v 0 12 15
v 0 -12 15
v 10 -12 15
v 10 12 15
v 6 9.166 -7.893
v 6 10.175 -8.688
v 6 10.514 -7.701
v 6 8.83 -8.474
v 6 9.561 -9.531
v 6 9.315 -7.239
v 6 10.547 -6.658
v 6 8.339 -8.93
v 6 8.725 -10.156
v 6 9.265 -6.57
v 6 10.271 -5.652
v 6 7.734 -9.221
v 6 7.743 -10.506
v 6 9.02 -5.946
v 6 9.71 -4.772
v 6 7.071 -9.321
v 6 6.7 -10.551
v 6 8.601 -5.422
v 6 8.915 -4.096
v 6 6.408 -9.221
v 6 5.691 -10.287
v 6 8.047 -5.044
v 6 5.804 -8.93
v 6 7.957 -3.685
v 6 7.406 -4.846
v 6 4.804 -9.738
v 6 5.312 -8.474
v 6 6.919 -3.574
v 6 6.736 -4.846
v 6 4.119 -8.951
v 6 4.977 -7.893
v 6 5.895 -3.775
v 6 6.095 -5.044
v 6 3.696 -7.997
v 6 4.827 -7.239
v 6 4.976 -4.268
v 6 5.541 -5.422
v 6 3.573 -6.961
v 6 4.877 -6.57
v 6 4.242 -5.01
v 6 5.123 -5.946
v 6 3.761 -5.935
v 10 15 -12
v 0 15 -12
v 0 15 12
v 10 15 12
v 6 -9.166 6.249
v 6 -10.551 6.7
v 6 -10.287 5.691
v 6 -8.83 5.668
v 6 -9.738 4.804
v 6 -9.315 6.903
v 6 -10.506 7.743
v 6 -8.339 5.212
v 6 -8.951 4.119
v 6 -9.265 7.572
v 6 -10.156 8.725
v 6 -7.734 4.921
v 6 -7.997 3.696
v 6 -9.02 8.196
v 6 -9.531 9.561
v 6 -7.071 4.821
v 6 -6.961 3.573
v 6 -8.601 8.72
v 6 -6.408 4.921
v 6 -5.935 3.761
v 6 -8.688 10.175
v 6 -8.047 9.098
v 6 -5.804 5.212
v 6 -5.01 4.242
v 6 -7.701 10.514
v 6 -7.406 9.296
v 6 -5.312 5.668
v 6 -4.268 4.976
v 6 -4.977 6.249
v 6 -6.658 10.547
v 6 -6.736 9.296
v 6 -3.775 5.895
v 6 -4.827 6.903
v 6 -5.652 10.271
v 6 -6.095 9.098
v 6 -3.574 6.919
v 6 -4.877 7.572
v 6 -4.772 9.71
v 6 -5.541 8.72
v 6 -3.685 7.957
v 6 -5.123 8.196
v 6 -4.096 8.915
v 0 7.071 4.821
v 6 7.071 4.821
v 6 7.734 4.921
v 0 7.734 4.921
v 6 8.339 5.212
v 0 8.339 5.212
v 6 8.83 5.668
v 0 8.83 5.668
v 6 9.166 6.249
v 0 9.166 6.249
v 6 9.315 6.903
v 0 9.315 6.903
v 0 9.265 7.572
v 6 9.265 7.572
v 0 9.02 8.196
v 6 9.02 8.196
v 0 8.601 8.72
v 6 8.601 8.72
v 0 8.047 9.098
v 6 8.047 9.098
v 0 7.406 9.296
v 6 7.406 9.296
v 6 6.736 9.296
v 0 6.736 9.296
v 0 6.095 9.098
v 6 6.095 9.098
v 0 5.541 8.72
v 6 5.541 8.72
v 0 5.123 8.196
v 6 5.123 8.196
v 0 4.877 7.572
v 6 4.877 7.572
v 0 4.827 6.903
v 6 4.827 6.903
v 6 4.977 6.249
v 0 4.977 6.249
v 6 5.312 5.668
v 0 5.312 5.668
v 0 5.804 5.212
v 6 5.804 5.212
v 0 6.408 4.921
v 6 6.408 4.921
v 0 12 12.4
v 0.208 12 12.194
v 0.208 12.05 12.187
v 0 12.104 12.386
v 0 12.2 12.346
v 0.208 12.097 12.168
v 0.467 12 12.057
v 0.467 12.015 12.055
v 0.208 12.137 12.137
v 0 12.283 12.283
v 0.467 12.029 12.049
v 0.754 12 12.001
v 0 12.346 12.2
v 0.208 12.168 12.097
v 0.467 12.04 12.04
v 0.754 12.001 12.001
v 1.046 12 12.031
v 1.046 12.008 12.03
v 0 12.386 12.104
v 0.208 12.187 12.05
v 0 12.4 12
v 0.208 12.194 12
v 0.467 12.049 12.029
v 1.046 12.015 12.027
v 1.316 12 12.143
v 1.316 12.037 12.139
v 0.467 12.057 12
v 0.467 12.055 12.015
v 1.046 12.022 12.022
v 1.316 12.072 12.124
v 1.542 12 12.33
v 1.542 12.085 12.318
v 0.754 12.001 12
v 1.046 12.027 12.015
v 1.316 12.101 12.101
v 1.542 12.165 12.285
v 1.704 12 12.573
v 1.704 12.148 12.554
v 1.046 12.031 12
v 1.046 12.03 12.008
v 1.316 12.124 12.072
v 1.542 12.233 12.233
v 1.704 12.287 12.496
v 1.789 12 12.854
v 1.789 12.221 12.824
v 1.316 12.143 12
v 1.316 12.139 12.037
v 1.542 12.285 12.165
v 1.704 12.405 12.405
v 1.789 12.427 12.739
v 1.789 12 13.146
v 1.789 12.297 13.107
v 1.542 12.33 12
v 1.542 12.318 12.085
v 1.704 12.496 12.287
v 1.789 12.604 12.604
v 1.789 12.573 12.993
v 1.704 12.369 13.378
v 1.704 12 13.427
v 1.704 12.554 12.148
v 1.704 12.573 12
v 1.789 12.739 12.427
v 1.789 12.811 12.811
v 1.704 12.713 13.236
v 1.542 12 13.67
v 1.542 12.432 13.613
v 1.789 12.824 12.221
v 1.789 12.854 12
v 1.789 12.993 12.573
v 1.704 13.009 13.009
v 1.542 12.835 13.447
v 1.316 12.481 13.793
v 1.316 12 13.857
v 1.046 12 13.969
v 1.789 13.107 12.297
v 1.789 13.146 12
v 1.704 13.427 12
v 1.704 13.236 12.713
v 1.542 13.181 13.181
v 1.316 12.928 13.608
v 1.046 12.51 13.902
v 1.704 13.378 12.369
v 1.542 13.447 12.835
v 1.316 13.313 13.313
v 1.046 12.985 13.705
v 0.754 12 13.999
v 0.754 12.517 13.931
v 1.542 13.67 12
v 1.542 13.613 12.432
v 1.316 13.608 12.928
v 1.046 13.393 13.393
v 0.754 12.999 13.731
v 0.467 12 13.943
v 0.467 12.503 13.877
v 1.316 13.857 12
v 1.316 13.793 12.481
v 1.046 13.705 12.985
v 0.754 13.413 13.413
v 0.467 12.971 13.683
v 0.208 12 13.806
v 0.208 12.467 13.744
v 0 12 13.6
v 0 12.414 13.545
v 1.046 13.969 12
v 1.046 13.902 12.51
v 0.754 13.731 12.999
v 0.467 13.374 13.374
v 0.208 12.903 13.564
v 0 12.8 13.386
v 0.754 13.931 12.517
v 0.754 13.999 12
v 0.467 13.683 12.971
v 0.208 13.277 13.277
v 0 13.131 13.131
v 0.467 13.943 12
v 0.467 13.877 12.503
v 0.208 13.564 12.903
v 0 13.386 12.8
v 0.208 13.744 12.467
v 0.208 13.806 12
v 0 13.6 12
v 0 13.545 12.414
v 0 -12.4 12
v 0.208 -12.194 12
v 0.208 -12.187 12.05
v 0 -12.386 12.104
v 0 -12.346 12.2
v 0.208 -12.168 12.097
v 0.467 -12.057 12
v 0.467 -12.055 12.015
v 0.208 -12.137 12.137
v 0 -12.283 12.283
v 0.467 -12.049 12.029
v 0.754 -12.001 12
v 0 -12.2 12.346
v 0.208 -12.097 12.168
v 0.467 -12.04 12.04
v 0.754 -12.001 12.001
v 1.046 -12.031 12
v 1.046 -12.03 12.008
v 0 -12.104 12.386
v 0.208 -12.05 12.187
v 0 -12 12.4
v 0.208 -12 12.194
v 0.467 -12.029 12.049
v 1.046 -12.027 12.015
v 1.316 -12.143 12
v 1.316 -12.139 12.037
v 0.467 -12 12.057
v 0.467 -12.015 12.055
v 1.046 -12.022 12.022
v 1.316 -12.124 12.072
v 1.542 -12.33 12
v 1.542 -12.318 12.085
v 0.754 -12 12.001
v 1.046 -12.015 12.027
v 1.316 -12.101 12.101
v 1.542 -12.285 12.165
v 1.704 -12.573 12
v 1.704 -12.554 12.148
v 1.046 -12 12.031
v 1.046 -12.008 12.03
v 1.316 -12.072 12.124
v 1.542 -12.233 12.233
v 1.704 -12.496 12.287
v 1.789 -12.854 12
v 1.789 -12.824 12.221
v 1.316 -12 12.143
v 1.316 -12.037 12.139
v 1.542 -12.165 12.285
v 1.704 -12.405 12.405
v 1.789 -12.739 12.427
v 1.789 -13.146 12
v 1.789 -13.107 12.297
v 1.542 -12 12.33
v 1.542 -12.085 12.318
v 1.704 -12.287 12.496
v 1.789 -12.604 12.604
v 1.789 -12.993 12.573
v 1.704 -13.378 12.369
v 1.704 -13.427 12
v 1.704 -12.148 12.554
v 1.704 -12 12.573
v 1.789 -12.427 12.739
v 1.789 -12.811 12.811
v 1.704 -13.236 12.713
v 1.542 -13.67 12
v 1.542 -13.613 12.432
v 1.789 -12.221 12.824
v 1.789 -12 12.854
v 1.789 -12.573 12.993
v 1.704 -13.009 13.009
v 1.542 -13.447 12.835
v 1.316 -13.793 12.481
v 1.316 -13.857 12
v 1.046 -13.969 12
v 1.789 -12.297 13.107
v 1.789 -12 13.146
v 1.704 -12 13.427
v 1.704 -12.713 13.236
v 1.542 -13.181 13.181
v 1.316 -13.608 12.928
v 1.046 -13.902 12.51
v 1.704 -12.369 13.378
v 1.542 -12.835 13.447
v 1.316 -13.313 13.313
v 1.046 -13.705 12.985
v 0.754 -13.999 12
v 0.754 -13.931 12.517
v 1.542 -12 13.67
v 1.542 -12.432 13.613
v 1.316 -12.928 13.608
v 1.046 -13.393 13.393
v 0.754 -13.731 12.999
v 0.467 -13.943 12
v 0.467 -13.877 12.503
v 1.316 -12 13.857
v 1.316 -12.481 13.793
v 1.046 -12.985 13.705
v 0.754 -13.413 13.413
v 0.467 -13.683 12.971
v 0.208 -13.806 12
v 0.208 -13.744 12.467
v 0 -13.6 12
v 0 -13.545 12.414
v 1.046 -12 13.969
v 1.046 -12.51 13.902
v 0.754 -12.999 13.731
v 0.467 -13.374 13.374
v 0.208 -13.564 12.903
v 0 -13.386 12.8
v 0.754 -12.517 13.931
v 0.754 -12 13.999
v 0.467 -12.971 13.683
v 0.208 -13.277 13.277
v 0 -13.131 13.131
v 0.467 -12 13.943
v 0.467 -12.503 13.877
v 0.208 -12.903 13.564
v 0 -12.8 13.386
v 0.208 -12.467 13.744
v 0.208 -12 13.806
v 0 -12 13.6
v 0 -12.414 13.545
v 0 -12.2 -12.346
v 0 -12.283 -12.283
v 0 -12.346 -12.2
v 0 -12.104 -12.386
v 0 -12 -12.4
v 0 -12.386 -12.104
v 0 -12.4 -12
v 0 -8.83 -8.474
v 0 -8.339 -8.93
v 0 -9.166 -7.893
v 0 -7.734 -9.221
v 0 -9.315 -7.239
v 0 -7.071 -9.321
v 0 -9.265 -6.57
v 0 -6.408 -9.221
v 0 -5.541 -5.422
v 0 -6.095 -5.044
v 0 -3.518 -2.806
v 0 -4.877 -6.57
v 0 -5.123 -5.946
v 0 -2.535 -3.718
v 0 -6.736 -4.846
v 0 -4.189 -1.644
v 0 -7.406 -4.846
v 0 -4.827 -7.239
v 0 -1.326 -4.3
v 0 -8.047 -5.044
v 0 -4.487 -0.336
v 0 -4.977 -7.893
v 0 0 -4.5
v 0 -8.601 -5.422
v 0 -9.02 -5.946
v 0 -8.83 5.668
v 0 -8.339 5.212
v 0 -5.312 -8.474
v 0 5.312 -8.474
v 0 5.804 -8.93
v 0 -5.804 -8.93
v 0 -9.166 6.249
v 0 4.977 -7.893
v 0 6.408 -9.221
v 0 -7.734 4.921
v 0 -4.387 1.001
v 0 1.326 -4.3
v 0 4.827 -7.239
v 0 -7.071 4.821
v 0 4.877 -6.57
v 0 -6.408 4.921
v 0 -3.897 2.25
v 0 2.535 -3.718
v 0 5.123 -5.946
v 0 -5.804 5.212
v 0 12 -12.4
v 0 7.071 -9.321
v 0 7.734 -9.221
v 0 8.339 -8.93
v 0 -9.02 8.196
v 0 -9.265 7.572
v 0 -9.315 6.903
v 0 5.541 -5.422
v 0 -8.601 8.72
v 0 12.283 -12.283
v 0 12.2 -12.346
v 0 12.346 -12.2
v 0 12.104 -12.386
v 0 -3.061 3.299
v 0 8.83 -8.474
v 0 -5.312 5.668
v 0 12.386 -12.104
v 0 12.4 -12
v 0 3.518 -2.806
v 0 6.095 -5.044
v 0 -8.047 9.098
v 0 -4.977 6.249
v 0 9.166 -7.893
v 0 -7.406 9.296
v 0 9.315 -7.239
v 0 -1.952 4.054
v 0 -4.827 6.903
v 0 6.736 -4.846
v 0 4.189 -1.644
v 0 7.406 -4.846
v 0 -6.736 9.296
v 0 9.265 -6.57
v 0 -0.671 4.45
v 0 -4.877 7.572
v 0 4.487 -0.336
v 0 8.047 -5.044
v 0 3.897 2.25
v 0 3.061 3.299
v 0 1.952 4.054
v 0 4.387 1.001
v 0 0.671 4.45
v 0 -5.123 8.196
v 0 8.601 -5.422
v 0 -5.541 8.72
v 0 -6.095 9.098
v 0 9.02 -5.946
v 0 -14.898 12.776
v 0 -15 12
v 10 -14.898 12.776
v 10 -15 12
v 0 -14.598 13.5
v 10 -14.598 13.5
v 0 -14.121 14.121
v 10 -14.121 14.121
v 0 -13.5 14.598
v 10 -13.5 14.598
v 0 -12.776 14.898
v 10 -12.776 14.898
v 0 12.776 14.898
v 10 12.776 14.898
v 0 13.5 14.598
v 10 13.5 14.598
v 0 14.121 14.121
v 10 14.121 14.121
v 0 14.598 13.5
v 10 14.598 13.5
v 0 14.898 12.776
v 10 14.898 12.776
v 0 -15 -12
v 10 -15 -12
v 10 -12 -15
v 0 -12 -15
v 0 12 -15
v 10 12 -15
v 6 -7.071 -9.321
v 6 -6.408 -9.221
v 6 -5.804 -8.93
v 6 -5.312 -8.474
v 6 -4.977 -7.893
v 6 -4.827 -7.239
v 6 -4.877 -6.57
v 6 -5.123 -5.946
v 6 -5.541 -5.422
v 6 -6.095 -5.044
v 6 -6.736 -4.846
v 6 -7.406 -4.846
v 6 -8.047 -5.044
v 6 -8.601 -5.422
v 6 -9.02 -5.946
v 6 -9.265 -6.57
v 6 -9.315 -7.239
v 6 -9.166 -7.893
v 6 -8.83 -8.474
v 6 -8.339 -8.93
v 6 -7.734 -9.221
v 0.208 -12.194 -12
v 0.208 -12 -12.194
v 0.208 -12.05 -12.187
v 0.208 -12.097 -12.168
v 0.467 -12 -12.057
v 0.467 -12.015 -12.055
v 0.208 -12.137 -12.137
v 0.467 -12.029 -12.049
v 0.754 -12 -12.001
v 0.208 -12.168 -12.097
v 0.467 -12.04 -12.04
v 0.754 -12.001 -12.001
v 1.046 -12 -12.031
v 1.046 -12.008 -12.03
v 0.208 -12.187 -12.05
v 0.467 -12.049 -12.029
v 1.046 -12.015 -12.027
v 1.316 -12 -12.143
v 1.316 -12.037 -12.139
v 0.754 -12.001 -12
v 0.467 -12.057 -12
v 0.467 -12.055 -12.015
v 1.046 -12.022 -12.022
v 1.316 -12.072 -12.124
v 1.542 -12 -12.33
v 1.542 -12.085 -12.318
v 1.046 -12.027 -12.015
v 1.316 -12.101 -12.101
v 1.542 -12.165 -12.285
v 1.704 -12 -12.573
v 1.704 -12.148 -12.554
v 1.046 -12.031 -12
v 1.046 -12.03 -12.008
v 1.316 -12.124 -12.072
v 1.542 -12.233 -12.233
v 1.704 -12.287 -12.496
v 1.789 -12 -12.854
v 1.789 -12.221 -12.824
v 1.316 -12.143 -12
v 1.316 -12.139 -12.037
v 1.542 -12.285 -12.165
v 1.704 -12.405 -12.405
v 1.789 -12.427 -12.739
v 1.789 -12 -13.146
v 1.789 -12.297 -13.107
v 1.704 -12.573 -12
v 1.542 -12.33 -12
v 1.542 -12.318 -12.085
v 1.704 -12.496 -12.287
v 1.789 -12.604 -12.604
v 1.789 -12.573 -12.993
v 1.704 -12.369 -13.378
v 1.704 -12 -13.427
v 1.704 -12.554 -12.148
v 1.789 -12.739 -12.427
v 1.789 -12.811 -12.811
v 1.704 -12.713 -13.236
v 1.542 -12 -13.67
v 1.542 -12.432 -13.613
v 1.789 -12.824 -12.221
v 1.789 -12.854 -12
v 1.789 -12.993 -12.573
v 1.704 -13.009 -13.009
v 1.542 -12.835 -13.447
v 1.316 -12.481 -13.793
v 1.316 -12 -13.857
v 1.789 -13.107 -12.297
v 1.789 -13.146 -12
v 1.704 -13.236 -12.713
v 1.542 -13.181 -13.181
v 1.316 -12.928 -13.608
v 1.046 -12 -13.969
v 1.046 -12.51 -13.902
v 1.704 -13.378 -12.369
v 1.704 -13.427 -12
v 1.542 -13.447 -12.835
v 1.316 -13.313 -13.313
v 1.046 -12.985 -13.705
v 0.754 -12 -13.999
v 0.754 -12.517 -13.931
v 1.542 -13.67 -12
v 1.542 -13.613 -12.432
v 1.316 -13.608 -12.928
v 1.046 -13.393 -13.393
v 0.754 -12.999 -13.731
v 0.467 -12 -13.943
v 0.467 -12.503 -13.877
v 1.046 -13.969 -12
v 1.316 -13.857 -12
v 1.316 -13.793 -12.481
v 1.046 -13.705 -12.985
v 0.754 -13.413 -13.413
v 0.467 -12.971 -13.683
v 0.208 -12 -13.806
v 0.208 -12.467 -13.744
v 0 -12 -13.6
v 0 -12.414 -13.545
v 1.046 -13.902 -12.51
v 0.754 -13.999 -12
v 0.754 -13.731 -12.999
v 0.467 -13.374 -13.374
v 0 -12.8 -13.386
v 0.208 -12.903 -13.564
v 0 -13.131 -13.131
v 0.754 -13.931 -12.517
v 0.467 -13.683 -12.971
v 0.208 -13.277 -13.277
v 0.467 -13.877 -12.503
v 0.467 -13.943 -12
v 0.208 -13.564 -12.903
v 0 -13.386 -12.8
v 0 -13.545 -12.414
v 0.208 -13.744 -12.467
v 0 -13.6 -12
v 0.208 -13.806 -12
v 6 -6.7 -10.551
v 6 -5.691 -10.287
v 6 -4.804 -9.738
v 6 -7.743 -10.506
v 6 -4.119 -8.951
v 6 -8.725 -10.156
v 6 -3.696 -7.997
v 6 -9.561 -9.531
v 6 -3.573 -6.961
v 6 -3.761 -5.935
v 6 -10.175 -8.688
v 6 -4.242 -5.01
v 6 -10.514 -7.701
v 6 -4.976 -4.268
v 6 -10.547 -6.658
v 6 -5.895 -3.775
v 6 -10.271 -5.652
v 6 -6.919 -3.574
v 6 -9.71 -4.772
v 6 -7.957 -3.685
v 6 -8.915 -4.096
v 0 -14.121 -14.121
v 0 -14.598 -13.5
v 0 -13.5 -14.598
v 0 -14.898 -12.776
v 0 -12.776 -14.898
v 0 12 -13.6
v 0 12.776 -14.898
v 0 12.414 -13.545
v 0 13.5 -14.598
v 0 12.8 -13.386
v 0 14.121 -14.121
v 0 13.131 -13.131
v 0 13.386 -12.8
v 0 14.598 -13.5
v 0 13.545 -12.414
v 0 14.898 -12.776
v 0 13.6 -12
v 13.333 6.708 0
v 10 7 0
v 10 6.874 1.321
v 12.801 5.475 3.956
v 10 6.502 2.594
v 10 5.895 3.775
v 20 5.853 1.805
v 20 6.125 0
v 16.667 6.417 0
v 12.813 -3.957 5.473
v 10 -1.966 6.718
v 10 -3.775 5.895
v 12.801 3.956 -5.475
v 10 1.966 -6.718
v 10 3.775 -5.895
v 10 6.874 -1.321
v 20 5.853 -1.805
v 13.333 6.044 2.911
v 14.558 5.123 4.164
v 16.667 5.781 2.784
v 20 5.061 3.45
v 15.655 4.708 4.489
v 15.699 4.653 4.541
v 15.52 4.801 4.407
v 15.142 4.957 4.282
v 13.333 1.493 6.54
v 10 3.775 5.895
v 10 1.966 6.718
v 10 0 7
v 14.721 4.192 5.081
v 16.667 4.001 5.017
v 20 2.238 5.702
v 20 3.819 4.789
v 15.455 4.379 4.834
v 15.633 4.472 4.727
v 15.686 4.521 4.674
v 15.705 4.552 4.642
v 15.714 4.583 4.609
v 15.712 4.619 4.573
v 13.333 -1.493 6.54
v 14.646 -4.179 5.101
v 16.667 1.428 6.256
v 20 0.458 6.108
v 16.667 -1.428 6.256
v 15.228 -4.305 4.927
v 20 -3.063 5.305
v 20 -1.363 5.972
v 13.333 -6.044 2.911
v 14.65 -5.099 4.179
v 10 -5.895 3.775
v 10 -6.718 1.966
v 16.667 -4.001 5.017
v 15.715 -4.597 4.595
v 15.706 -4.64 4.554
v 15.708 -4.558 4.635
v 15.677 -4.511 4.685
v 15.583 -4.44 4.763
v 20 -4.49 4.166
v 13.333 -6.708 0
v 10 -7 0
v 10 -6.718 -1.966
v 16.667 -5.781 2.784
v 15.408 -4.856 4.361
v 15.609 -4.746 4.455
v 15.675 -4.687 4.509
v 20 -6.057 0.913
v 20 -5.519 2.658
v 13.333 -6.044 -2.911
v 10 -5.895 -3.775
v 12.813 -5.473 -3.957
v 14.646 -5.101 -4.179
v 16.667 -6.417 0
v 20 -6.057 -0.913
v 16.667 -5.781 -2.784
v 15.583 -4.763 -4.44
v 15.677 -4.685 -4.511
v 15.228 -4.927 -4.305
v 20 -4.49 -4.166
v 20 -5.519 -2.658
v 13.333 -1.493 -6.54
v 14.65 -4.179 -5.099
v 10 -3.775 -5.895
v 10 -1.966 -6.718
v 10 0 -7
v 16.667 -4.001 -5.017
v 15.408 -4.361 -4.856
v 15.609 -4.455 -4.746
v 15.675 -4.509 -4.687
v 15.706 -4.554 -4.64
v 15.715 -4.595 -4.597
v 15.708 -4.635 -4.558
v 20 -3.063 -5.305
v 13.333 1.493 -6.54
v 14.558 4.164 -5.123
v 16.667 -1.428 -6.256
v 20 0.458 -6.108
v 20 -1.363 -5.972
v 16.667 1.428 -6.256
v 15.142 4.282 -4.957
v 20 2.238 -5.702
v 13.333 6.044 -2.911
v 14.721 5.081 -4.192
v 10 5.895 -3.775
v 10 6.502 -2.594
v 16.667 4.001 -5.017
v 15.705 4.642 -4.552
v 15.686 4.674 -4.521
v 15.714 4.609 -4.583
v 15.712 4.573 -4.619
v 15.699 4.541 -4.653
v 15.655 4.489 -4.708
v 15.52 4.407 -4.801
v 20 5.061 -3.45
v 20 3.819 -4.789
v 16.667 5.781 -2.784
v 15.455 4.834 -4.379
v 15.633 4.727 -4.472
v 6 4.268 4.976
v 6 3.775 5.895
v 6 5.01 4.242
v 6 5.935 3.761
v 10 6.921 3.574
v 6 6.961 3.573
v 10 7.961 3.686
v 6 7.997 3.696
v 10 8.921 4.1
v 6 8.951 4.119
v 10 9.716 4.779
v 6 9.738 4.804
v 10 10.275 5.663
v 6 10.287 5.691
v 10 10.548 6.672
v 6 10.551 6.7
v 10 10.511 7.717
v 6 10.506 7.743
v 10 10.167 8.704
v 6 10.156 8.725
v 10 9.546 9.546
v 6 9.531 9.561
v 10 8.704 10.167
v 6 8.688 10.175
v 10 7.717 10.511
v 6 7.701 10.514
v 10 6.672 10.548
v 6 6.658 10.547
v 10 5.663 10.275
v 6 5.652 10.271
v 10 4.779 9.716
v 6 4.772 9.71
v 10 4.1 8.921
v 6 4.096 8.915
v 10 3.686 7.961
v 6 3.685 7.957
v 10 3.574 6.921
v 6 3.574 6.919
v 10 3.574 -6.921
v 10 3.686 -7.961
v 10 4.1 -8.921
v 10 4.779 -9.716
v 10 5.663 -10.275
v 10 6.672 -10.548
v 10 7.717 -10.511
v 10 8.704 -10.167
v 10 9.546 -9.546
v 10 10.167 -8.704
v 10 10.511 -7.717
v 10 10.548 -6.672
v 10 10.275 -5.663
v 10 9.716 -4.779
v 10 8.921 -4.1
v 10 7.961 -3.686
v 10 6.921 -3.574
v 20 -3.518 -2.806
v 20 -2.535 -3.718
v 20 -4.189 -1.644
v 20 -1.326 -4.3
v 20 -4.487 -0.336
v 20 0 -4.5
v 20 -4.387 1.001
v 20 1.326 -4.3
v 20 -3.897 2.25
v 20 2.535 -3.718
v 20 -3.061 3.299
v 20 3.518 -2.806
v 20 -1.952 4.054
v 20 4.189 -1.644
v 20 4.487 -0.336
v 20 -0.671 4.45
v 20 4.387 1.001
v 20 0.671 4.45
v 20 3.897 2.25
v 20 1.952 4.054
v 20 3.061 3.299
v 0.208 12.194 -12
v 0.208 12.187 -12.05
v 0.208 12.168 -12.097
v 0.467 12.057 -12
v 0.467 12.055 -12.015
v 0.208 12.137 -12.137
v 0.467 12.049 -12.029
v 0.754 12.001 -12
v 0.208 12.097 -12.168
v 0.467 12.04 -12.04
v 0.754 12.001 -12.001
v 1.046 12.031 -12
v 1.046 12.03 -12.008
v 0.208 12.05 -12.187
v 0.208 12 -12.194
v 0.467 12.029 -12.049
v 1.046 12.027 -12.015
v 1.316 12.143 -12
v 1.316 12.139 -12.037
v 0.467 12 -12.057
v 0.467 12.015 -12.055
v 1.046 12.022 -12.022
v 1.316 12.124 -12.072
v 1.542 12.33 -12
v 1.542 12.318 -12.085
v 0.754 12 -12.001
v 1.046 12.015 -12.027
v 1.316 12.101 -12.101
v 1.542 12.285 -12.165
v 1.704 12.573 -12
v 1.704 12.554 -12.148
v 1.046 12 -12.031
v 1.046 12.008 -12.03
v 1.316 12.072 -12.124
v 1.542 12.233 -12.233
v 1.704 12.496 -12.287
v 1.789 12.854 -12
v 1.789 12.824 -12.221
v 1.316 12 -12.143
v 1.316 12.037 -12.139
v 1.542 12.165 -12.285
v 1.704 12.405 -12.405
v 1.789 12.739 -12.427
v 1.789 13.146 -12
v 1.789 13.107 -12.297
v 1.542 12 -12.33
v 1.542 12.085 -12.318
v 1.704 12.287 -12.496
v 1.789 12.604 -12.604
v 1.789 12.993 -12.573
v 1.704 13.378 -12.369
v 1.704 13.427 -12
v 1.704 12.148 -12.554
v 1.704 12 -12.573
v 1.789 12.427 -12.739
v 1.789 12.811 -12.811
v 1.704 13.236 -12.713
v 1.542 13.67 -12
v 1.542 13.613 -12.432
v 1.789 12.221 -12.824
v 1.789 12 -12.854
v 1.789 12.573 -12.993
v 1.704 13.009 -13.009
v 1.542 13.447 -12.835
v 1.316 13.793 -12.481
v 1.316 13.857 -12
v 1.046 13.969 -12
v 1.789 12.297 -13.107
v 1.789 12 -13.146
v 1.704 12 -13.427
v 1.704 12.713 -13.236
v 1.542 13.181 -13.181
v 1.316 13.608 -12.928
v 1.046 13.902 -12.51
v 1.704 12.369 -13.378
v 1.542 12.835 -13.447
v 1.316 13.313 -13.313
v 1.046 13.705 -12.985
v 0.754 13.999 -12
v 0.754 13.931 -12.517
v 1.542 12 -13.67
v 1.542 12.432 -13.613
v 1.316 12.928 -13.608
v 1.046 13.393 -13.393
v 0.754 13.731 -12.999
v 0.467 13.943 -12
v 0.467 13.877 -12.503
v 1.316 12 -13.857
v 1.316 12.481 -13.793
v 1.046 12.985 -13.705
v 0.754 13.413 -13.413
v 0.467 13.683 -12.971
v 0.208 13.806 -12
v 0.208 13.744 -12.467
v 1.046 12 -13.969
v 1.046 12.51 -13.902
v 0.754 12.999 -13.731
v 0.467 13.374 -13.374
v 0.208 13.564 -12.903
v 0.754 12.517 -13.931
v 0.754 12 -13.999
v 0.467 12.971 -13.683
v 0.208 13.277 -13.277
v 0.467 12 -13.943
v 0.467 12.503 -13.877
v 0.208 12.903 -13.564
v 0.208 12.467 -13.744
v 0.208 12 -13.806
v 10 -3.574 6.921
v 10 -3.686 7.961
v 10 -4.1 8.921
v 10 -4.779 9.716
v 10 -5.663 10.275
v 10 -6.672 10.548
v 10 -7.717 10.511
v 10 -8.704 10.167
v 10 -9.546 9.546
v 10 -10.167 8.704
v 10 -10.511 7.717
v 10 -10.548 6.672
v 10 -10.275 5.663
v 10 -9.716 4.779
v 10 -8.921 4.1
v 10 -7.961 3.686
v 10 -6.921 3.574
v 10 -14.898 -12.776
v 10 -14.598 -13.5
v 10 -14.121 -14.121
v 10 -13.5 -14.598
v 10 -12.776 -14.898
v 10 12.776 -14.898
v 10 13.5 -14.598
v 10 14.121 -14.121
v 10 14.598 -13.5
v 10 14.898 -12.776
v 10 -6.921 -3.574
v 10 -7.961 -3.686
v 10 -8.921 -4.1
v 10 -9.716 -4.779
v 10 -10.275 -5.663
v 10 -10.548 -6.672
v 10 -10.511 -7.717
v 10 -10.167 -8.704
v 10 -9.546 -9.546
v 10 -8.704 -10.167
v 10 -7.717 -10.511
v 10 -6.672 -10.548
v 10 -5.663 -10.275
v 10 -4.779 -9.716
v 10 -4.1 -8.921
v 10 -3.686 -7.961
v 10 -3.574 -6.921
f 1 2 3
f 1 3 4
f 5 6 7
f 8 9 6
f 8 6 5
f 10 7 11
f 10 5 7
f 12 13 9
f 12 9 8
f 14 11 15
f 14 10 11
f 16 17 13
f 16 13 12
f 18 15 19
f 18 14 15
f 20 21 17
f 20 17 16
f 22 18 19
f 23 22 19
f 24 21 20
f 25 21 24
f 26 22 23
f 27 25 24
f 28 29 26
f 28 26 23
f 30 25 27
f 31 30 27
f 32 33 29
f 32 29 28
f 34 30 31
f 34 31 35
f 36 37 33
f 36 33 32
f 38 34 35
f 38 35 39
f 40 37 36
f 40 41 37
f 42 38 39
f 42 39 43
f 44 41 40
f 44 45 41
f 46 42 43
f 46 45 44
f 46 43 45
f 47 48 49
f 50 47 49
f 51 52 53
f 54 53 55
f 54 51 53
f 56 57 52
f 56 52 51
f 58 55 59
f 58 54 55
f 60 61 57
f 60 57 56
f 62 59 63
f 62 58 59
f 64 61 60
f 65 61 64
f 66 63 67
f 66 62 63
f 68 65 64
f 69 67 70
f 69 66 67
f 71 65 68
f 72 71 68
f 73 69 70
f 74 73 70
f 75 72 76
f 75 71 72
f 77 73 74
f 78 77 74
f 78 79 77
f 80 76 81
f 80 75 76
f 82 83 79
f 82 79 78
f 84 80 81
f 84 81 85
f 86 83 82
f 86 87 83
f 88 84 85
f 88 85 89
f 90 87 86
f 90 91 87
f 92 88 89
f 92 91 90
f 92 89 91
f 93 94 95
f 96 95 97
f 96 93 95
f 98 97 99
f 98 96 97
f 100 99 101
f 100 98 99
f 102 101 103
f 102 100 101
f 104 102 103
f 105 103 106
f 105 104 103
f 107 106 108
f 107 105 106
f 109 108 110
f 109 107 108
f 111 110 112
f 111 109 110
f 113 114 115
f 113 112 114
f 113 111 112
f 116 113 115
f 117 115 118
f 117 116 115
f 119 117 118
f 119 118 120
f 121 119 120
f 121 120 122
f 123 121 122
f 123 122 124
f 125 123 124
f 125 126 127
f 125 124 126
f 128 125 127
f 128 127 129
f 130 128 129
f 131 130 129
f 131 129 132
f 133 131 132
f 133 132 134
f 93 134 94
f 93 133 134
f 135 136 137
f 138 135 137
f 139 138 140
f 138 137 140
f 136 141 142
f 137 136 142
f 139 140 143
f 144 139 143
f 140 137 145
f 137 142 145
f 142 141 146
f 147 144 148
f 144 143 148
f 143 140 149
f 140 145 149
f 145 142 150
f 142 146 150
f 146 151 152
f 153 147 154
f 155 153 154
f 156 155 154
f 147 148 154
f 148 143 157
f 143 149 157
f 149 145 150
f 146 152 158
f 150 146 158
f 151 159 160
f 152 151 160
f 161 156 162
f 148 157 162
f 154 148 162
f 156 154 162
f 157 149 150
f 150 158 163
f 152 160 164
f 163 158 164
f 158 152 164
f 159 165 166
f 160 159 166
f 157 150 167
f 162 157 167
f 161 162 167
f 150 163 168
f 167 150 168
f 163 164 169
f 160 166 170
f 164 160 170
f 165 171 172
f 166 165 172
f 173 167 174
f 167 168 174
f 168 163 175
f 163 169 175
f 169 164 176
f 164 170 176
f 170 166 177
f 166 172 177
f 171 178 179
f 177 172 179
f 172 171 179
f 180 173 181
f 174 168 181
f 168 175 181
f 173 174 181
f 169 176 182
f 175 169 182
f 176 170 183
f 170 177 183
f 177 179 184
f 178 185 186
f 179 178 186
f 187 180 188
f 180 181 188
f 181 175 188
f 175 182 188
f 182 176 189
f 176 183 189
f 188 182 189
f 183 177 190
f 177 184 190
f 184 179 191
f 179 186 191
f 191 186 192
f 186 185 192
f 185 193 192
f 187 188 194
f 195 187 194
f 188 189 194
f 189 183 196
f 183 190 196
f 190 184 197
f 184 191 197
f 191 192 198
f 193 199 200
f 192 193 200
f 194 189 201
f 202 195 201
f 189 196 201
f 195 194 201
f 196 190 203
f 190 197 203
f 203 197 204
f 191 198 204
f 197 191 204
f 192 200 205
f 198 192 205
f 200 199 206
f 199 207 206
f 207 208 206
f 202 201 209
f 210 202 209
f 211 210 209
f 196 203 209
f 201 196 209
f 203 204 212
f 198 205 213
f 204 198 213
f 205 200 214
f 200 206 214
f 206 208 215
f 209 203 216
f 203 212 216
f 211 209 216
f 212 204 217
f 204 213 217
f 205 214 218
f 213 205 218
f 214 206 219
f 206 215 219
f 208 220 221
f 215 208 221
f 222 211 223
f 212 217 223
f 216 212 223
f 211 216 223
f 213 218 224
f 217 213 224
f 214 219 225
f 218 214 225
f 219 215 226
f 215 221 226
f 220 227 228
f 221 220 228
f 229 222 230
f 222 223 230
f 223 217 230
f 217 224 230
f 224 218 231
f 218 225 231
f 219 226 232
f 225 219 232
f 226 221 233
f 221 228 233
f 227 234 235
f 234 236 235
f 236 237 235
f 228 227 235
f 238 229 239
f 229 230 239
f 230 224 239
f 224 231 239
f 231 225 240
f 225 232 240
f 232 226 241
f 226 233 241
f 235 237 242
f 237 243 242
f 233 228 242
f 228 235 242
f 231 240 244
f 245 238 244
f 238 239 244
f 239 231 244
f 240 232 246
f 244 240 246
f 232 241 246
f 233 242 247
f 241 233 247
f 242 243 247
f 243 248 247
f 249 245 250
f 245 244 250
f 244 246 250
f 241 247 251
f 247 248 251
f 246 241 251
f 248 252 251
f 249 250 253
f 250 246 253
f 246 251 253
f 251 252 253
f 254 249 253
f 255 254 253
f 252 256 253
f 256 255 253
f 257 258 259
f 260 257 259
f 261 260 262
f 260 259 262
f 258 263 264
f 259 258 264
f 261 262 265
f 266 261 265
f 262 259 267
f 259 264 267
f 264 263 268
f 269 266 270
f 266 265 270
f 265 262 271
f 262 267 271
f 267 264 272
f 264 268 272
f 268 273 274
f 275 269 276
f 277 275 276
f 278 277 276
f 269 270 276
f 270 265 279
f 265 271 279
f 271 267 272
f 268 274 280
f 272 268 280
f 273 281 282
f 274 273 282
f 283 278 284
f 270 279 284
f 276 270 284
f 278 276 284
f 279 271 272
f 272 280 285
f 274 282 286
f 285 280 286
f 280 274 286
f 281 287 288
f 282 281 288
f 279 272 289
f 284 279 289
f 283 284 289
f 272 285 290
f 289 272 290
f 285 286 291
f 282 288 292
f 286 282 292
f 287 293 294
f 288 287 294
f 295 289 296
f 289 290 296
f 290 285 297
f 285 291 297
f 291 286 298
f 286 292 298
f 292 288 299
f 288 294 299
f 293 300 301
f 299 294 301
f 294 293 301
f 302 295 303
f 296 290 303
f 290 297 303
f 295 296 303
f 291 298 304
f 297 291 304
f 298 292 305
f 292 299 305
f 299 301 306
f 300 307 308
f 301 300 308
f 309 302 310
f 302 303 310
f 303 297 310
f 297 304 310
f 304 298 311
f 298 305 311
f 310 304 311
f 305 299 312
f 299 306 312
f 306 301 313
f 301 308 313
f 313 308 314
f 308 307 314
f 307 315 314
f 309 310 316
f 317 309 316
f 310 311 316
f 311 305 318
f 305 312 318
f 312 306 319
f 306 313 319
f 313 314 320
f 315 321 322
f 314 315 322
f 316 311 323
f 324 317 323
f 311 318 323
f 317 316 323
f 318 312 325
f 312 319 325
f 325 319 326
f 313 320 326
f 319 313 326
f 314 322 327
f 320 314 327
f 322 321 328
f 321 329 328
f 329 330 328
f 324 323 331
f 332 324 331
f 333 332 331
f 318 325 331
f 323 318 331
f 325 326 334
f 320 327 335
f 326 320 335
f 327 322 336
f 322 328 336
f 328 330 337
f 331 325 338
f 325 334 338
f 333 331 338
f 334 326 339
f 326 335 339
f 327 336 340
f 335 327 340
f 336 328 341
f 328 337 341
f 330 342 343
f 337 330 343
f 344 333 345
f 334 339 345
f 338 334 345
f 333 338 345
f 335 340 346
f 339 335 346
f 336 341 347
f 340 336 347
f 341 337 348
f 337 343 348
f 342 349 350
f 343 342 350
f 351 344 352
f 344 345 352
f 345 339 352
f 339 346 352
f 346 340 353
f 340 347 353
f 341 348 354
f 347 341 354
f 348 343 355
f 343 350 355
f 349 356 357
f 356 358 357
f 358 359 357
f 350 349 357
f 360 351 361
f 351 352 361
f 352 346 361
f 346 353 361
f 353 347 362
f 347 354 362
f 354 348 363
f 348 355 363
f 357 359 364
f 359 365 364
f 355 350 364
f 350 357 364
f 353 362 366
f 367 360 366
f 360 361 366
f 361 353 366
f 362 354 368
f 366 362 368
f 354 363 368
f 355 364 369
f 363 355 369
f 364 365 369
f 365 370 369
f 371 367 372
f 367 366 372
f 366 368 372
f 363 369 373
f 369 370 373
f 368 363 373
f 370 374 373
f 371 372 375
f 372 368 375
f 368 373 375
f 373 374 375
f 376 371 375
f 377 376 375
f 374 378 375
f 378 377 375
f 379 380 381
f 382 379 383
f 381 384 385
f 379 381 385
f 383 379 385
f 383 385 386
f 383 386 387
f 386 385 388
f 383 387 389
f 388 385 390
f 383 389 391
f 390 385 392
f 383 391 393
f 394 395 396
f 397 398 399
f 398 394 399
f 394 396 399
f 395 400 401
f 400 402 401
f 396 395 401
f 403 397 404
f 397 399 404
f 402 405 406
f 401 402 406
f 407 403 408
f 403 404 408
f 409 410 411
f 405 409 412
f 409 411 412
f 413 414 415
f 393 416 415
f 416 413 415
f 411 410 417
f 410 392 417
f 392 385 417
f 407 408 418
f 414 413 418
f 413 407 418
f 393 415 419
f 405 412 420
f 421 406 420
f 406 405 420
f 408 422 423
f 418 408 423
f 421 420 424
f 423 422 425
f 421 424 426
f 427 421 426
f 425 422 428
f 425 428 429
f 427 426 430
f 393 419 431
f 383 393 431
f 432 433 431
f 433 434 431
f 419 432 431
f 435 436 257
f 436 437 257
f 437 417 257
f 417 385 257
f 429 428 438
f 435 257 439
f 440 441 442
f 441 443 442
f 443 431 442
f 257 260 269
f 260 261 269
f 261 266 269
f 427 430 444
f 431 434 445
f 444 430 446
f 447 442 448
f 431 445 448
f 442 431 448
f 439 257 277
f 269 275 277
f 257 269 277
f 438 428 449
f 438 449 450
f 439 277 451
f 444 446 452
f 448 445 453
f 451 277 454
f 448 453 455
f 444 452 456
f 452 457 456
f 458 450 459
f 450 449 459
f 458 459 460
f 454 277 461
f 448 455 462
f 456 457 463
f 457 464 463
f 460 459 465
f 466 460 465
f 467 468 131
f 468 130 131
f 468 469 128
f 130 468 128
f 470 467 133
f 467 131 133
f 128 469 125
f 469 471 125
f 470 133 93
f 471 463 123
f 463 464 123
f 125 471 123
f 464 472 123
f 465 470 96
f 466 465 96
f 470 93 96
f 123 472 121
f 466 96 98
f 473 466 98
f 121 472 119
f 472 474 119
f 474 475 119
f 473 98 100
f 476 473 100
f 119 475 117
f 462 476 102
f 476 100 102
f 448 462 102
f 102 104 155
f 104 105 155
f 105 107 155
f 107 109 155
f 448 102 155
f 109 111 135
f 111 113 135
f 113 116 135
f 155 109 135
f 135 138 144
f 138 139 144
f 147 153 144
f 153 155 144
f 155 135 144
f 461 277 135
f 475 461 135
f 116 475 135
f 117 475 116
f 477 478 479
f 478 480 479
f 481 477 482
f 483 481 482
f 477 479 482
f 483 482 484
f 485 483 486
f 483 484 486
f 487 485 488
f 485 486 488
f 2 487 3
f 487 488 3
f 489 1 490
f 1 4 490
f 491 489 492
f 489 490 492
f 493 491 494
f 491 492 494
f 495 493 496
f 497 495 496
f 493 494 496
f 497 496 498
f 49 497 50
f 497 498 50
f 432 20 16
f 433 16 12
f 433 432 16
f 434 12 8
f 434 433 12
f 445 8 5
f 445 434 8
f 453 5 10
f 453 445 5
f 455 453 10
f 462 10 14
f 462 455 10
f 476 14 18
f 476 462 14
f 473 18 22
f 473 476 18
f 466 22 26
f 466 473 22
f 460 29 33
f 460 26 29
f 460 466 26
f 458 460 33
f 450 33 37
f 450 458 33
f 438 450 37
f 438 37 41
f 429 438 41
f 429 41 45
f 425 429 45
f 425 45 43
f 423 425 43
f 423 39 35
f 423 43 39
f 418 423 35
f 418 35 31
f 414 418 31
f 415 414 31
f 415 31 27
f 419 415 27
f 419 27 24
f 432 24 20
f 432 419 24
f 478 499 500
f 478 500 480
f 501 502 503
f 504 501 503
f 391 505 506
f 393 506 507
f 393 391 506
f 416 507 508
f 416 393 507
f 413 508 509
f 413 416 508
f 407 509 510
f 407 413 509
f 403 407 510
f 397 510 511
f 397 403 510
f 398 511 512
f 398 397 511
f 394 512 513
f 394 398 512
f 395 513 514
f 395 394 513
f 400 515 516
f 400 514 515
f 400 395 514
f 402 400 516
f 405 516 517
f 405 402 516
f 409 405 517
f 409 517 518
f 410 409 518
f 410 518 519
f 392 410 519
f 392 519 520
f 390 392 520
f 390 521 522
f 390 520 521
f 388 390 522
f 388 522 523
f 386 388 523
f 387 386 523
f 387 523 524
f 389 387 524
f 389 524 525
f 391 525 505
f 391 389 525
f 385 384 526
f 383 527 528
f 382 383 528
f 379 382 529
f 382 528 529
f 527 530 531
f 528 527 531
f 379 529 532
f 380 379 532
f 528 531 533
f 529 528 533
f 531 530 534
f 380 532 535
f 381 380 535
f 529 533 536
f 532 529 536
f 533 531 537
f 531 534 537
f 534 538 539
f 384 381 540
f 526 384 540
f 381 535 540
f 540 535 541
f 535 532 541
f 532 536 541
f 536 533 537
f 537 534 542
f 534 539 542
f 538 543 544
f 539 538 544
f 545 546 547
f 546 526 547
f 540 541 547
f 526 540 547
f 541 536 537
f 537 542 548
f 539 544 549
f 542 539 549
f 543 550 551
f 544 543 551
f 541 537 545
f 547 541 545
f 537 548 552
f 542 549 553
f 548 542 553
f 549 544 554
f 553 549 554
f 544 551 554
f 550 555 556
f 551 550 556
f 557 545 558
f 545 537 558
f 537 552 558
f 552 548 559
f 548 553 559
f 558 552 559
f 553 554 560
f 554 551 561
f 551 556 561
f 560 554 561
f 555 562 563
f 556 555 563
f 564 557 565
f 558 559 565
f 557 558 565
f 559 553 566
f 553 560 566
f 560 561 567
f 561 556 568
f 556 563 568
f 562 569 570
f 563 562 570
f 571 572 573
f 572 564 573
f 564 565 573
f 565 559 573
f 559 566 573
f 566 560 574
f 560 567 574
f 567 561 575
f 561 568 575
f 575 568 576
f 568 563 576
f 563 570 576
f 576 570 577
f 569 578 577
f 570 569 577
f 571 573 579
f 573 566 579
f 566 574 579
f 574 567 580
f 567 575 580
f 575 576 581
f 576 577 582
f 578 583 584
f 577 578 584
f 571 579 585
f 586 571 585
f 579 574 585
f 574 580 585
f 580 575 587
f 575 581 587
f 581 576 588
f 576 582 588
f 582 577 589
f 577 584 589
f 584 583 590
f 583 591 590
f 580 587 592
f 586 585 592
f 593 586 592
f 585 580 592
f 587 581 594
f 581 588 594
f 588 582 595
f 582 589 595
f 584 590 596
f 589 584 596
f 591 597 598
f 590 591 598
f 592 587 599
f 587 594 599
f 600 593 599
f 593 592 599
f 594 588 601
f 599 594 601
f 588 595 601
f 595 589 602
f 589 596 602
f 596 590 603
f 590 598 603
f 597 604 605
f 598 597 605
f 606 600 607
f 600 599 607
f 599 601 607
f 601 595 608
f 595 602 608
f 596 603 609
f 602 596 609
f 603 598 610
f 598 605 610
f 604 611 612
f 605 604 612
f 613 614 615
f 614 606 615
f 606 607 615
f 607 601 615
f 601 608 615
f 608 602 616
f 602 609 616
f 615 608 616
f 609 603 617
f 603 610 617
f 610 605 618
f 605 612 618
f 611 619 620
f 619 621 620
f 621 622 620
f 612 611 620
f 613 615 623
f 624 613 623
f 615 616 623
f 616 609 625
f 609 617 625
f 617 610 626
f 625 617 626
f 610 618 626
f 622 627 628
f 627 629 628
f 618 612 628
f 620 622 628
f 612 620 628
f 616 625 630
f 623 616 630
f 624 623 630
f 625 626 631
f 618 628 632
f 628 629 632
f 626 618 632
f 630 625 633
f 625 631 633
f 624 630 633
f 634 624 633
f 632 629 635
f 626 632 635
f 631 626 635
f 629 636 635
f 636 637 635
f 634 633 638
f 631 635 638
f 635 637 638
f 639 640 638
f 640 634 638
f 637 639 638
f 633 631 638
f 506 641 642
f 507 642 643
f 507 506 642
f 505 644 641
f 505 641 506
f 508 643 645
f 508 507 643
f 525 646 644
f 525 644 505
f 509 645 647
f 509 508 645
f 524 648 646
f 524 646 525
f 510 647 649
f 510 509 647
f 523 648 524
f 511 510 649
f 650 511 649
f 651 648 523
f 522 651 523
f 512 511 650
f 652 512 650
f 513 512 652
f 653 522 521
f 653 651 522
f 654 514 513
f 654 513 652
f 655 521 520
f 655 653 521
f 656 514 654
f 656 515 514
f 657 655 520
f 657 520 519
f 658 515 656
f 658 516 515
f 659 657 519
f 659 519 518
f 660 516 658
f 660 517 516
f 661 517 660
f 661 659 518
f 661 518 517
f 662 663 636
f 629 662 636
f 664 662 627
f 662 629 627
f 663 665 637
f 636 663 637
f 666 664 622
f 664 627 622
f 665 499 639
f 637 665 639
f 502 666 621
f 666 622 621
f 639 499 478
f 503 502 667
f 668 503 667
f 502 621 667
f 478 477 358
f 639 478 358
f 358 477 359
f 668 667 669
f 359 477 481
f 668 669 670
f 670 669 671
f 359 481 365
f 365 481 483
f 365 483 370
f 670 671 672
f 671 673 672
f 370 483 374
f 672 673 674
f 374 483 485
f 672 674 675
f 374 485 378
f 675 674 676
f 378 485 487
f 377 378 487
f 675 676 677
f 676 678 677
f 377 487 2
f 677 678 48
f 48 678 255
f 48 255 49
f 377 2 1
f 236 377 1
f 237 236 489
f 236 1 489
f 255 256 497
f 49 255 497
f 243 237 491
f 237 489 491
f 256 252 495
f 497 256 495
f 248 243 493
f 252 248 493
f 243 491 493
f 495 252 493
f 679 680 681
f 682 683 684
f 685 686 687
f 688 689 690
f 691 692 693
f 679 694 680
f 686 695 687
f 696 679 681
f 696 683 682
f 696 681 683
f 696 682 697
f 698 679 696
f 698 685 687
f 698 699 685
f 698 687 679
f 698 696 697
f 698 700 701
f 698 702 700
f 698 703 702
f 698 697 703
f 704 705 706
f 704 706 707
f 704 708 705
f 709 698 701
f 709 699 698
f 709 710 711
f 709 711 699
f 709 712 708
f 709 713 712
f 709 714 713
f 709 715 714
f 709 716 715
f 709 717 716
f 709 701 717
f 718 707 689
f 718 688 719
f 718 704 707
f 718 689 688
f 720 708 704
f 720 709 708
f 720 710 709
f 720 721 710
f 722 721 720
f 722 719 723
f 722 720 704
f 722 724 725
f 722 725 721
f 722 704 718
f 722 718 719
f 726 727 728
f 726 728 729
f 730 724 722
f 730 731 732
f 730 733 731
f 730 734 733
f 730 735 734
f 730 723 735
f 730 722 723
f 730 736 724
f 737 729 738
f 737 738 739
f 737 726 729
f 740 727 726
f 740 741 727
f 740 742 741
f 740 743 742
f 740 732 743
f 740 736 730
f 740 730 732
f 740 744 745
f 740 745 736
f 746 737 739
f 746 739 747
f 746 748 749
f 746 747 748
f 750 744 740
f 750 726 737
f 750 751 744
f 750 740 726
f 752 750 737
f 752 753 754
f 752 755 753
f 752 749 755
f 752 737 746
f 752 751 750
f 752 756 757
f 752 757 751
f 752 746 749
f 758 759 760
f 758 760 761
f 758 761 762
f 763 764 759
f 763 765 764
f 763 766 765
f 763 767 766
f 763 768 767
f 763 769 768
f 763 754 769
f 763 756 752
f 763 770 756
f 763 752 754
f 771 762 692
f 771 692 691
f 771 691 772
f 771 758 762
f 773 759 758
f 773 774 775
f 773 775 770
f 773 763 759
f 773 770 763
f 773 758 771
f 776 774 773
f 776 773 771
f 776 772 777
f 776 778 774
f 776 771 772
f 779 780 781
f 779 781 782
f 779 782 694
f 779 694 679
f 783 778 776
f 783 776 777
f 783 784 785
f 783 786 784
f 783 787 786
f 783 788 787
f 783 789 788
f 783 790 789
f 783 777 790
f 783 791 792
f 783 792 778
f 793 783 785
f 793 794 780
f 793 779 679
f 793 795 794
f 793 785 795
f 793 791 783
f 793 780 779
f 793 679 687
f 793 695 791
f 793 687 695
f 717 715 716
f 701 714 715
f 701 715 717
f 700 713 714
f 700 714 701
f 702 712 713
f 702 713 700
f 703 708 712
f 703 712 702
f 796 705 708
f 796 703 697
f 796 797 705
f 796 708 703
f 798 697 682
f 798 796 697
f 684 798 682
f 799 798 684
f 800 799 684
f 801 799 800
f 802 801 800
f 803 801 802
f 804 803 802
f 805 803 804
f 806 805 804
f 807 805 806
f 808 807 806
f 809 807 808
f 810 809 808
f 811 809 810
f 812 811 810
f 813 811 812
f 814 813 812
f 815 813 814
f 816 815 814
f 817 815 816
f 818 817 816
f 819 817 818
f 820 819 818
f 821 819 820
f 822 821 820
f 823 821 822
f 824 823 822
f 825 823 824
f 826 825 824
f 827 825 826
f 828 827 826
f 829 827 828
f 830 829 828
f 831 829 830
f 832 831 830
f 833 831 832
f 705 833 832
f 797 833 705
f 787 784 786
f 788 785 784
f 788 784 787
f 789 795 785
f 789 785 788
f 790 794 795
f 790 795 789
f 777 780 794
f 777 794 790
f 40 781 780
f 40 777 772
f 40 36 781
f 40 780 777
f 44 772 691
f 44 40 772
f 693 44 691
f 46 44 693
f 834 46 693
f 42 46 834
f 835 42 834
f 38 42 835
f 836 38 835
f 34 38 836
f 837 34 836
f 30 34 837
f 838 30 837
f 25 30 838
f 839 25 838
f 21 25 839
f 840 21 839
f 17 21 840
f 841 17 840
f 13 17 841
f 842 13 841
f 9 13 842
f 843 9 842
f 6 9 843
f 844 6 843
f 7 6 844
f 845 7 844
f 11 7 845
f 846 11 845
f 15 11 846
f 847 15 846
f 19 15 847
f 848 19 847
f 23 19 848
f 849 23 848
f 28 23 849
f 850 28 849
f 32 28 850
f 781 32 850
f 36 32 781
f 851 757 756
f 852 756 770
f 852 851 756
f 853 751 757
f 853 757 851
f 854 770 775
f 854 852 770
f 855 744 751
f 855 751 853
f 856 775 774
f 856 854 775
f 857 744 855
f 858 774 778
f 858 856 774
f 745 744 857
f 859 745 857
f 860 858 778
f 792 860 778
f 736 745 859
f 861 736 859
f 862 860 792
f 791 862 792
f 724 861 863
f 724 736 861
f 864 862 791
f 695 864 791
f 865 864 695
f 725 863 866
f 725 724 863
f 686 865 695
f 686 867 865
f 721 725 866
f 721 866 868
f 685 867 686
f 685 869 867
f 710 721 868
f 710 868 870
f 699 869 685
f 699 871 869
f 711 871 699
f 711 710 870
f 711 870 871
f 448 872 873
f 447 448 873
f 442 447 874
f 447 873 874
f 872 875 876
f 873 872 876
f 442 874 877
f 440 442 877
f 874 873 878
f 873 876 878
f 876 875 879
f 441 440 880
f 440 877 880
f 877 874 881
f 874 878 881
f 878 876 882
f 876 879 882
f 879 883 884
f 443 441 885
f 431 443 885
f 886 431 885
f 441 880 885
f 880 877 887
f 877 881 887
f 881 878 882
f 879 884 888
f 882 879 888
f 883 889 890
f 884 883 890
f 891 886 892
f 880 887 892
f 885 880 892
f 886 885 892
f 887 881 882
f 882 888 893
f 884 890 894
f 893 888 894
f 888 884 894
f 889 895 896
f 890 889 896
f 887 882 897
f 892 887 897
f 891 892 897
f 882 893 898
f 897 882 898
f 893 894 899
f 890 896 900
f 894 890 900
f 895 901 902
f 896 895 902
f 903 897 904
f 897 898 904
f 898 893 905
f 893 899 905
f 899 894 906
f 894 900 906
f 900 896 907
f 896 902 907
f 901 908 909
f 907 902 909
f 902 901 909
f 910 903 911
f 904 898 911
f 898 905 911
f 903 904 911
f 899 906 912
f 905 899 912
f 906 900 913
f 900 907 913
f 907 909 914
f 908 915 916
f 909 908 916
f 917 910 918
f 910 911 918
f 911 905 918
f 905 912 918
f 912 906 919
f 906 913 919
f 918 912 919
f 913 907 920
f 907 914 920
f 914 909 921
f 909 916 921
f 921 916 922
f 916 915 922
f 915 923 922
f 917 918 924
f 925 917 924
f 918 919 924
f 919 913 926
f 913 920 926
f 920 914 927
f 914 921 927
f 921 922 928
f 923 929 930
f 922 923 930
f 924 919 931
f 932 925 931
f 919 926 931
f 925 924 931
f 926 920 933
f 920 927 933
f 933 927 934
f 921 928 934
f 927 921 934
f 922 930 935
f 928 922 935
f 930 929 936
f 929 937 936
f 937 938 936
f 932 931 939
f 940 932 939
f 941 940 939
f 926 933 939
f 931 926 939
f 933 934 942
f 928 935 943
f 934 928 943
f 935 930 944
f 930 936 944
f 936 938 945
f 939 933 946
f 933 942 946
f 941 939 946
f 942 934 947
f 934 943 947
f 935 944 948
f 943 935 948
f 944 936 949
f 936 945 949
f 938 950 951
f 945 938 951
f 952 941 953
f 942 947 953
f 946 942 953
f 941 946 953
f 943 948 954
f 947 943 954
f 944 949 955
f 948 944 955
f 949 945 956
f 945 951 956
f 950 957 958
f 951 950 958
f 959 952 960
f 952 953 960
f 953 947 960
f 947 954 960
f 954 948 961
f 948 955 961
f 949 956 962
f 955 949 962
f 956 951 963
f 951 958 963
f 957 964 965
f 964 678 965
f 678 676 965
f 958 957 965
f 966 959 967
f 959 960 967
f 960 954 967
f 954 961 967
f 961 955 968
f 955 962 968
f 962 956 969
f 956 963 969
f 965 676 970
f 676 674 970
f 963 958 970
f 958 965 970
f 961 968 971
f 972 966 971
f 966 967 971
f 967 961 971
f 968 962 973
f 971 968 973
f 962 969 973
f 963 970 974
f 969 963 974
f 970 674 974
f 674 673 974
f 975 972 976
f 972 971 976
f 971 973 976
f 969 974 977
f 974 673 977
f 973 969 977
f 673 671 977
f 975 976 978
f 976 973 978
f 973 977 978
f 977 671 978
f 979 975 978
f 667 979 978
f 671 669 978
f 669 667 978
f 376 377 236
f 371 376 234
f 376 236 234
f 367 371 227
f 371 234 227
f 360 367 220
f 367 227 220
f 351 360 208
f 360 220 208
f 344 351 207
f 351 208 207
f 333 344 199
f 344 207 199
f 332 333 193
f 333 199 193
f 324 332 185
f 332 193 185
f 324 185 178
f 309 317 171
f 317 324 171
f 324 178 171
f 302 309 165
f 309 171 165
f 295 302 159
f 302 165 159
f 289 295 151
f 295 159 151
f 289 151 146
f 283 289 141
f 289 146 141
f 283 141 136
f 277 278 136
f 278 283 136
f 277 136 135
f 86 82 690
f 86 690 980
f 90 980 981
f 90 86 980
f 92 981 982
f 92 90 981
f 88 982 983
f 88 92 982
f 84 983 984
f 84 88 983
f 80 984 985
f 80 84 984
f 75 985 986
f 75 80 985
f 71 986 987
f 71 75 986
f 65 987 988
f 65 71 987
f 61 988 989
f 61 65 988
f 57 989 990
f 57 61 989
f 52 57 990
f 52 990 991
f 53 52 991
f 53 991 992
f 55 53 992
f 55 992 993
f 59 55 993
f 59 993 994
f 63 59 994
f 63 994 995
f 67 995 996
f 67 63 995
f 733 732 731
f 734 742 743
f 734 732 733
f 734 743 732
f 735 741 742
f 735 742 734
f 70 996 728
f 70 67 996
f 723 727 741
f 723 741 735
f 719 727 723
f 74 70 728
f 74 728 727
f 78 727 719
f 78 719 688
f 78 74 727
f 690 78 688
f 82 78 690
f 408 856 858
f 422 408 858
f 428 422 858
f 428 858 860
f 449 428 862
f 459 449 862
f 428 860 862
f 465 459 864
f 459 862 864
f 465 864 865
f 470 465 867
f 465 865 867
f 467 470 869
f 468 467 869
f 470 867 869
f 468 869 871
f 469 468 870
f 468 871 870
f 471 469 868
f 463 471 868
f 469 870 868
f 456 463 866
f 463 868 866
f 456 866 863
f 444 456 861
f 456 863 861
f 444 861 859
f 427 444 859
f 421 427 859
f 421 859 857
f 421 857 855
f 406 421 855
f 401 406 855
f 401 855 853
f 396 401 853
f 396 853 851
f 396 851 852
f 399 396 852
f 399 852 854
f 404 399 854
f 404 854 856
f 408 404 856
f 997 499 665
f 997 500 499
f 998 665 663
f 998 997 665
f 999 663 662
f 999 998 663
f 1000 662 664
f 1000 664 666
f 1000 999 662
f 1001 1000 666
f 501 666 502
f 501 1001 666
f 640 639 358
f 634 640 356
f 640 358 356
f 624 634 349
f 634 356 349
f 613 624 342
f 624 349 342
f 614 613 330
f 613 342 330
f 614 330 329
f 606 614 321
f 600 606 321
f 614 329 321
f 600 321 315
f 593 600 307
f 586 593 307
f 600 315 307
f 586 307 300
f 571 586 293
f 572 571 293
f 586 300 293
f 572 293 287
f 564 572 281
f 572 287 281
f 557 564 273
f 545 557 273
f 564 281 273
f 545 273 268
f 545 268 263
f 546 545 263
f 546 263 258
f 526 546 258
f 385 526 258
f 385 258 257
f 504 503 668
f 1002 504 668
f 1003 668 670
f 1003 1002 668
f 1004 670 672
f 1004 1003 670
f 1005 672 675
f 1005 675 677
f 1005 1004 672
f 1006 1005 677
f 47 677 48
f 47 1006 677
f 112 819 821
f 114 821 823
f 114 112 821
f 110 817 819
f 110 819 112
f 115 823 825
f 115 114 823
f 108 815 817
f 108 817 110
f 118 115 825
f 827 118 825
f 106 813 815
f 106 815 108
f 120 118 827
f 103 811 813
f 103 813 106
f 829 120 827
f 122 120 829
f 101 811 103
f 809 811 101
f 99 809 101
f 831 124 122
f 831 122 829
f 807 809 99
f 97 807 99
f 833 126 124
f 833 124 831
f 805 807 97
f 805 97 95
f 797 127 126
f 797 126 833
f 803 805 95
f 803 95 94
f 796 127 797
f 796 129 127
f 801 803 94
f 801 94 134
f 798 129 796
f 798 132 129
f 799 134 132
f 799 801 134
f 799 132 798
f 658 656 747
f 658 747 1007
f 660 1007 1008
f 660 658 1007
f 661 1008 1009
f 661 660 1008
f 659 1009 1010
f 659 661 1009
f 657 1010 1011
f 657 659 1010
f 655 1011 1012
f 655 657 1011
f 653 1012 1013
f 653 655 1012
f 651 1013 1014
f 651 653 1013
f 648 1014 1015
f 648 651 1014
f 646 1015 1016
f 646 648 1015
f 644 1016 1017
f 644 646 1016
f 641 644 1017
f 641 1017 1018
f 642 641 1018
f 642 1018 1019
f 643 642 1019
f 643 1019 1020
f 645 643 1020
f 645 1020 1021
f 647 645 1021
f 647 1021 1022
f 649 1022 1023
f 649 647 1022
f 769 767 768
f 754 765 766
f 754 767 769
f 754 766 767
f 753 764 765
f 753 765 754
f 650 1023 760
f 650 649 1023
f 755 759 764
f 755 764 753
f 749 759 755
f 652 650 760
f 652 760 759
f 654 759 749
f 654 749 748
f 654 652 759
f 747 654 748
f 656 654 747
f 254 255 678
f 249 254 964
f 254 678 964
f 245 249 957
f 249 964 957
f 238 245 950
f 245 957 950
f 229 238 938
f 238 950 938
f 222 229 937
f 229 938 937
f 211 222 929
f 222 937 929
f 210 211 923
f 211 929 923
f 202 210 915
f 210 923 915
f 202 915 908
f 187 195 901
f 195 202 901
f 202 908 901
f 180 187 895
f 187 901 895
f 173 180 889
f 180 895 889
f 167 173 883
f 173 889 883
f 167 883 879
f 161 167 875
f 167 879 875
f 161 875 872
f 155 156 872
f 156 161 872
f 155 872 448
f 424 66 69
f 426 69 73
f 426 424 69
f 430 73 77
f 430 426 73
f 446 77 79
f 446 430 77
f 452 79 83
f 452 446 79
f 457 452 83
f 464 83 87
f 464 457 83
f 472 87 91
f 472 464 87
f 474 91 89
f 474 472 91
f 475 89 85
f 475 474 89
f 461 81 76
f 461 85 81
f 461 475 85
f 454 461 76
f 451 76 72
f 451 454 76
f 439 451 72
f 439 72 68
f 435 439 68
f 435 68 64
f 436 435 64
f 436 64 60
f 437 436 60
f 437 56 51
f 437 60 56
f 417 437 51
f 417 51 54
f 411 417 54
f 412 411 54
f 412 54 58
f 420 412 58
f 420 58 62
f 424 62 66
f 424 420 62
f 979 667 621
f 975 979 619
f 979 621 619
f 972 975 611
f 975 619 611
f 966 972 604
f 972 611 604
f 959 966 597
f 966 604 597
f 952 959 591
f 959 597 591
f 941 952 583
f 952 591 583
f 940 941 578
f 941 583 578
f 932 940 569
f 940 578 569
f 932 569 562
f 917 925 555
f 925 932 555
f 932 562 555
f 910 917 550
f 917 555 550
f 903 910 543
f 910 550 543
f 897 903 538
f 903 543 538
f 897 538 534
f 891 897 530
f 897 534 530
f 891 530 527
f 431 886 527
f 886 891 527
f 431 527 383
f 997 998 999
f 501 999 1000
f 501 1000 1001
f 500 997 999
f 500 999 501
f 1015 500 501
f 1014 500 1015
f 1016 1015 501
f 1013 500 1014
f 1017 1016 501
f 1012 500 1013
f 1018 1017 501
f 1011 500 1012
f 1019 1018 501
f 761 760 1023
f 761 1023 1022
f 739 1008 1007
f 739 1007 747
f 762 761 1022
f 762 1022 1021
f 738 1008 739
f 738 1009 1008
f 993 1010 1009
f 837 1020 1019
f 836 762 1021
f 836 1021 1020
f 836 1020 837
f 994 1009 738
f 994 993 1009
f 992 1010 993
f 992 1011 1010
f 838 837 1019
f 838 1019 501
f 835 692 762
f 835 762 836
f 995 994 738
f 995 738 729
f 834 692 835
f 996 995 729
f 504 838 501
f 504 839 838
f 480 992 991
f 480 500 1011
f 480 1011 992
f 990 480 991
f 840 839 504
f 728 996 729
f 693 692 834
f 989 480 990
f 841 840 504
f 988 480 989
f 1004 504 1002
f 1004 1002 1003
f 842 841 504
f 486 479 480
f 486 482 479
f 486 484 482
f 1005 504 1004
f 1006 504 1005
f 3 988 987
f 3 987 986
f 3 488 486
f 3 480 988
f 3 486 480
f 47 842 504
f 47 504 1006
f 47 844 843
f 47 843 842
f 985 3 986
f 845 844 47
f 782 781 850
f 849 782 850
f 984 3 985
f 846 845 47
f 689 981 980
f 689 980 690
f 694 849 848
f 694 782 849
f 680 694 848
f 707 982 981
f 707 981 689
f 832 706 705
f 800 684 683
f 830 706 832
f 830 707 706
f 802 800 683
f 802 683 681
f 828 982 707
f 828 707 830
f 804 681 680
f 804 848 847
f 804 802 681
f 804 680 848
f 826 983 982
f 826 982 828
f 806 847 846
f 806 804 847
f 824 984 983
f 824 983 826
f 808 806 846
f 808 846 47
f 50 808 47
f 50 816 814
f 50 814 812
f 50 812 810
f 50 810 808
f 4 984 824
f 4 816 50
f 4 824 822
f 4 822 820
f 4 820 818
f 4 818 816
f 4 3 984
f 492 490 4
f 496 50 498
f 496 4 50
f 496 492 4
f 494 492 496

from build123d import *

# Parameters (mm, degrees)
IZIM1_W                     = 30
IZIM1_H                     = 30
IZIM1_R                     = 2.25
Y_KSEKLIK_EKSTR_ZYON1_DEPTH = 10
RADYUS1_R                   = 3
IZIM2_R                     = 7
Y_KSEKLIK_EKSTR_ZYON2_DEPTH = 10
Y_KSEKLIK_EKSTR_ZYON2_TAPER = 5
IZIM3_R                     = 4.5
KES_EKSTR_ZYON1_DEPTH       = 30.154759474
KES_S_P_R2_PROFILE_R        = 1
KES_EKSTR_ZYON2_DEPTH       = 24.452078842
KES_EKSTR_ZYON2_DEPTH_BACK  = 4
IZIM34_R                    = 3.5


with BuildPart() as part:
    # Çizim1 → Yükseklik-Ekstrüzyon1 (new body)
    with BuildSketch(Plane.YZ):
        Rectangle(IZIM1_W, IZIM1_H)
        with Locations(Location((-7.071067812, 7.071067812, 0), (0, 0, 270))):
            Circle(IZIM1_R, mode=Mode.SUBTRACT)
        with Locations(Location((7.071067812, 7.071067812, 0), (0, 0, 270))):
            Circle(IZIM1_R, mode=Mode.SUBTRACT)
        with Locations(Location((7.071067812, -7.071067812, 0), (0, 0, 270))):
            Circle(IZIM1_R, mode=Mode.SUBTRACT)
        with Locations(Location((-7.071067812, -7.071067812, 0), (0, 0, 270))):
            Circle(IZIM1_R, mode=Mode.SUBTRACT)
    extrude(amount=Y_KSEKLIK_EKSTR_ZYON1_DEPTH)

    # Radyus1
    radyus1_edges = [part.edges().sort_by_distance(p)[0] for p in [
        (5, -15, 15),
        (5, 15, 15),
        (5, 15, -15),
        (5, -15, -15),
    ]]
    fillet(radyus1_edges, radius=RADYUS1_R)

    # Çizim2 → Yükseklik-Ekstrüzyon2 (add)
    with BuildSketch(Plane.YZ.offset(10)):
        Circle(IZIM2_R)
    extrude(amount=Y_KSEKLIK_EKSTR_ZYON2_DEPTH, taper=Y_KSEKLIK_EKSTR_ZYON2_TAPER)

    # Çizim3 → Kes-Ekstrüzyon1 (cut, through all)
    with BuildSketch(Plane.YZ.offset(20)):
        with Locations(Location((0, 0, 0), (0, 0, 270))):
            Circle(IZIM3_R)
    extrude(amount=-KES_EKSTR_ZYON1_DEPTH, mode=Mode.SUBTRACT)

    # Kes-Süpür2: sweep along a path in Çizim4
    with BuildLine(Plane(origin=(0.8, 0, 0), x_dir=(0, -1, 0), z_dir=(-1, 0, 0))) as kes_s_p_r2_path:
        Line((13, -12), (13, 12))
        ThreePointArc((13, 12), (12.707106781, 12.707106781), (12, 13))
        Line((12, 13), (-12, 13))
        ThreePointArc((-12, 13), (-12.707106781, 12.707106781), (-13, 12))
        Line((-13, 12), (-13, -12))
        ThreePointArc((-13, -12), (-12.707106781, -12.707106781), (-12, -13))
        Line((-12, -13), (12, -13))
        ThreePointArc((12, -13), (12.707106781, -12.707106781), (13, -12))
    # Kes-Süpür2 profile (on start of the path) → Kes-Süpür2 (sweep, cut)
    with BuildSketch(Plane(origin=(0.8, -13, -12), x_dir=(1, 0, 0), z_dir=(0, 0, 1))):
        Circle(KES_S_P_R2_PROFILE_R)
    sweep(path=kes_s_p_r2_path.line, mode=Mode.SUBTRACT)

    # Çizim34 → Kes-Ekstrüzyon2 (cut, two sides: drawn at the far end of the back side and taken through both)
    with BuildSketch(Plane.YZ.offset(10).offset(-KES_EKSTR_ZYON2_DEPTH_BACK)):
        with Locations(Location((-7.071067812, 7.071067812, 0), (0, 0, 340.368439442))):
            Circle(IZIM34_R)
        with Locations(Location((7.071067812, 7.071067812, 0), (0, 0, 199.631561315))):
            Circle(IZIM34_R)
        with Locations(Location((7.071067812, -7.071067812, 0), (0, 0, 109.631561315))):
            Circle(IZIM34_R)
        with Locations(Location((-7.071067812, -7.071067812, 0), (0, 0, 70.368439442))):
            Circle(IZIM34_R)
    extrude(amount=KES_EKSTR_ZYON2_DEPTH + KES_EKSTR_ZYON2_DEPTH_BACK, mode=Mode.SUBTRACT)


solid = part.part
